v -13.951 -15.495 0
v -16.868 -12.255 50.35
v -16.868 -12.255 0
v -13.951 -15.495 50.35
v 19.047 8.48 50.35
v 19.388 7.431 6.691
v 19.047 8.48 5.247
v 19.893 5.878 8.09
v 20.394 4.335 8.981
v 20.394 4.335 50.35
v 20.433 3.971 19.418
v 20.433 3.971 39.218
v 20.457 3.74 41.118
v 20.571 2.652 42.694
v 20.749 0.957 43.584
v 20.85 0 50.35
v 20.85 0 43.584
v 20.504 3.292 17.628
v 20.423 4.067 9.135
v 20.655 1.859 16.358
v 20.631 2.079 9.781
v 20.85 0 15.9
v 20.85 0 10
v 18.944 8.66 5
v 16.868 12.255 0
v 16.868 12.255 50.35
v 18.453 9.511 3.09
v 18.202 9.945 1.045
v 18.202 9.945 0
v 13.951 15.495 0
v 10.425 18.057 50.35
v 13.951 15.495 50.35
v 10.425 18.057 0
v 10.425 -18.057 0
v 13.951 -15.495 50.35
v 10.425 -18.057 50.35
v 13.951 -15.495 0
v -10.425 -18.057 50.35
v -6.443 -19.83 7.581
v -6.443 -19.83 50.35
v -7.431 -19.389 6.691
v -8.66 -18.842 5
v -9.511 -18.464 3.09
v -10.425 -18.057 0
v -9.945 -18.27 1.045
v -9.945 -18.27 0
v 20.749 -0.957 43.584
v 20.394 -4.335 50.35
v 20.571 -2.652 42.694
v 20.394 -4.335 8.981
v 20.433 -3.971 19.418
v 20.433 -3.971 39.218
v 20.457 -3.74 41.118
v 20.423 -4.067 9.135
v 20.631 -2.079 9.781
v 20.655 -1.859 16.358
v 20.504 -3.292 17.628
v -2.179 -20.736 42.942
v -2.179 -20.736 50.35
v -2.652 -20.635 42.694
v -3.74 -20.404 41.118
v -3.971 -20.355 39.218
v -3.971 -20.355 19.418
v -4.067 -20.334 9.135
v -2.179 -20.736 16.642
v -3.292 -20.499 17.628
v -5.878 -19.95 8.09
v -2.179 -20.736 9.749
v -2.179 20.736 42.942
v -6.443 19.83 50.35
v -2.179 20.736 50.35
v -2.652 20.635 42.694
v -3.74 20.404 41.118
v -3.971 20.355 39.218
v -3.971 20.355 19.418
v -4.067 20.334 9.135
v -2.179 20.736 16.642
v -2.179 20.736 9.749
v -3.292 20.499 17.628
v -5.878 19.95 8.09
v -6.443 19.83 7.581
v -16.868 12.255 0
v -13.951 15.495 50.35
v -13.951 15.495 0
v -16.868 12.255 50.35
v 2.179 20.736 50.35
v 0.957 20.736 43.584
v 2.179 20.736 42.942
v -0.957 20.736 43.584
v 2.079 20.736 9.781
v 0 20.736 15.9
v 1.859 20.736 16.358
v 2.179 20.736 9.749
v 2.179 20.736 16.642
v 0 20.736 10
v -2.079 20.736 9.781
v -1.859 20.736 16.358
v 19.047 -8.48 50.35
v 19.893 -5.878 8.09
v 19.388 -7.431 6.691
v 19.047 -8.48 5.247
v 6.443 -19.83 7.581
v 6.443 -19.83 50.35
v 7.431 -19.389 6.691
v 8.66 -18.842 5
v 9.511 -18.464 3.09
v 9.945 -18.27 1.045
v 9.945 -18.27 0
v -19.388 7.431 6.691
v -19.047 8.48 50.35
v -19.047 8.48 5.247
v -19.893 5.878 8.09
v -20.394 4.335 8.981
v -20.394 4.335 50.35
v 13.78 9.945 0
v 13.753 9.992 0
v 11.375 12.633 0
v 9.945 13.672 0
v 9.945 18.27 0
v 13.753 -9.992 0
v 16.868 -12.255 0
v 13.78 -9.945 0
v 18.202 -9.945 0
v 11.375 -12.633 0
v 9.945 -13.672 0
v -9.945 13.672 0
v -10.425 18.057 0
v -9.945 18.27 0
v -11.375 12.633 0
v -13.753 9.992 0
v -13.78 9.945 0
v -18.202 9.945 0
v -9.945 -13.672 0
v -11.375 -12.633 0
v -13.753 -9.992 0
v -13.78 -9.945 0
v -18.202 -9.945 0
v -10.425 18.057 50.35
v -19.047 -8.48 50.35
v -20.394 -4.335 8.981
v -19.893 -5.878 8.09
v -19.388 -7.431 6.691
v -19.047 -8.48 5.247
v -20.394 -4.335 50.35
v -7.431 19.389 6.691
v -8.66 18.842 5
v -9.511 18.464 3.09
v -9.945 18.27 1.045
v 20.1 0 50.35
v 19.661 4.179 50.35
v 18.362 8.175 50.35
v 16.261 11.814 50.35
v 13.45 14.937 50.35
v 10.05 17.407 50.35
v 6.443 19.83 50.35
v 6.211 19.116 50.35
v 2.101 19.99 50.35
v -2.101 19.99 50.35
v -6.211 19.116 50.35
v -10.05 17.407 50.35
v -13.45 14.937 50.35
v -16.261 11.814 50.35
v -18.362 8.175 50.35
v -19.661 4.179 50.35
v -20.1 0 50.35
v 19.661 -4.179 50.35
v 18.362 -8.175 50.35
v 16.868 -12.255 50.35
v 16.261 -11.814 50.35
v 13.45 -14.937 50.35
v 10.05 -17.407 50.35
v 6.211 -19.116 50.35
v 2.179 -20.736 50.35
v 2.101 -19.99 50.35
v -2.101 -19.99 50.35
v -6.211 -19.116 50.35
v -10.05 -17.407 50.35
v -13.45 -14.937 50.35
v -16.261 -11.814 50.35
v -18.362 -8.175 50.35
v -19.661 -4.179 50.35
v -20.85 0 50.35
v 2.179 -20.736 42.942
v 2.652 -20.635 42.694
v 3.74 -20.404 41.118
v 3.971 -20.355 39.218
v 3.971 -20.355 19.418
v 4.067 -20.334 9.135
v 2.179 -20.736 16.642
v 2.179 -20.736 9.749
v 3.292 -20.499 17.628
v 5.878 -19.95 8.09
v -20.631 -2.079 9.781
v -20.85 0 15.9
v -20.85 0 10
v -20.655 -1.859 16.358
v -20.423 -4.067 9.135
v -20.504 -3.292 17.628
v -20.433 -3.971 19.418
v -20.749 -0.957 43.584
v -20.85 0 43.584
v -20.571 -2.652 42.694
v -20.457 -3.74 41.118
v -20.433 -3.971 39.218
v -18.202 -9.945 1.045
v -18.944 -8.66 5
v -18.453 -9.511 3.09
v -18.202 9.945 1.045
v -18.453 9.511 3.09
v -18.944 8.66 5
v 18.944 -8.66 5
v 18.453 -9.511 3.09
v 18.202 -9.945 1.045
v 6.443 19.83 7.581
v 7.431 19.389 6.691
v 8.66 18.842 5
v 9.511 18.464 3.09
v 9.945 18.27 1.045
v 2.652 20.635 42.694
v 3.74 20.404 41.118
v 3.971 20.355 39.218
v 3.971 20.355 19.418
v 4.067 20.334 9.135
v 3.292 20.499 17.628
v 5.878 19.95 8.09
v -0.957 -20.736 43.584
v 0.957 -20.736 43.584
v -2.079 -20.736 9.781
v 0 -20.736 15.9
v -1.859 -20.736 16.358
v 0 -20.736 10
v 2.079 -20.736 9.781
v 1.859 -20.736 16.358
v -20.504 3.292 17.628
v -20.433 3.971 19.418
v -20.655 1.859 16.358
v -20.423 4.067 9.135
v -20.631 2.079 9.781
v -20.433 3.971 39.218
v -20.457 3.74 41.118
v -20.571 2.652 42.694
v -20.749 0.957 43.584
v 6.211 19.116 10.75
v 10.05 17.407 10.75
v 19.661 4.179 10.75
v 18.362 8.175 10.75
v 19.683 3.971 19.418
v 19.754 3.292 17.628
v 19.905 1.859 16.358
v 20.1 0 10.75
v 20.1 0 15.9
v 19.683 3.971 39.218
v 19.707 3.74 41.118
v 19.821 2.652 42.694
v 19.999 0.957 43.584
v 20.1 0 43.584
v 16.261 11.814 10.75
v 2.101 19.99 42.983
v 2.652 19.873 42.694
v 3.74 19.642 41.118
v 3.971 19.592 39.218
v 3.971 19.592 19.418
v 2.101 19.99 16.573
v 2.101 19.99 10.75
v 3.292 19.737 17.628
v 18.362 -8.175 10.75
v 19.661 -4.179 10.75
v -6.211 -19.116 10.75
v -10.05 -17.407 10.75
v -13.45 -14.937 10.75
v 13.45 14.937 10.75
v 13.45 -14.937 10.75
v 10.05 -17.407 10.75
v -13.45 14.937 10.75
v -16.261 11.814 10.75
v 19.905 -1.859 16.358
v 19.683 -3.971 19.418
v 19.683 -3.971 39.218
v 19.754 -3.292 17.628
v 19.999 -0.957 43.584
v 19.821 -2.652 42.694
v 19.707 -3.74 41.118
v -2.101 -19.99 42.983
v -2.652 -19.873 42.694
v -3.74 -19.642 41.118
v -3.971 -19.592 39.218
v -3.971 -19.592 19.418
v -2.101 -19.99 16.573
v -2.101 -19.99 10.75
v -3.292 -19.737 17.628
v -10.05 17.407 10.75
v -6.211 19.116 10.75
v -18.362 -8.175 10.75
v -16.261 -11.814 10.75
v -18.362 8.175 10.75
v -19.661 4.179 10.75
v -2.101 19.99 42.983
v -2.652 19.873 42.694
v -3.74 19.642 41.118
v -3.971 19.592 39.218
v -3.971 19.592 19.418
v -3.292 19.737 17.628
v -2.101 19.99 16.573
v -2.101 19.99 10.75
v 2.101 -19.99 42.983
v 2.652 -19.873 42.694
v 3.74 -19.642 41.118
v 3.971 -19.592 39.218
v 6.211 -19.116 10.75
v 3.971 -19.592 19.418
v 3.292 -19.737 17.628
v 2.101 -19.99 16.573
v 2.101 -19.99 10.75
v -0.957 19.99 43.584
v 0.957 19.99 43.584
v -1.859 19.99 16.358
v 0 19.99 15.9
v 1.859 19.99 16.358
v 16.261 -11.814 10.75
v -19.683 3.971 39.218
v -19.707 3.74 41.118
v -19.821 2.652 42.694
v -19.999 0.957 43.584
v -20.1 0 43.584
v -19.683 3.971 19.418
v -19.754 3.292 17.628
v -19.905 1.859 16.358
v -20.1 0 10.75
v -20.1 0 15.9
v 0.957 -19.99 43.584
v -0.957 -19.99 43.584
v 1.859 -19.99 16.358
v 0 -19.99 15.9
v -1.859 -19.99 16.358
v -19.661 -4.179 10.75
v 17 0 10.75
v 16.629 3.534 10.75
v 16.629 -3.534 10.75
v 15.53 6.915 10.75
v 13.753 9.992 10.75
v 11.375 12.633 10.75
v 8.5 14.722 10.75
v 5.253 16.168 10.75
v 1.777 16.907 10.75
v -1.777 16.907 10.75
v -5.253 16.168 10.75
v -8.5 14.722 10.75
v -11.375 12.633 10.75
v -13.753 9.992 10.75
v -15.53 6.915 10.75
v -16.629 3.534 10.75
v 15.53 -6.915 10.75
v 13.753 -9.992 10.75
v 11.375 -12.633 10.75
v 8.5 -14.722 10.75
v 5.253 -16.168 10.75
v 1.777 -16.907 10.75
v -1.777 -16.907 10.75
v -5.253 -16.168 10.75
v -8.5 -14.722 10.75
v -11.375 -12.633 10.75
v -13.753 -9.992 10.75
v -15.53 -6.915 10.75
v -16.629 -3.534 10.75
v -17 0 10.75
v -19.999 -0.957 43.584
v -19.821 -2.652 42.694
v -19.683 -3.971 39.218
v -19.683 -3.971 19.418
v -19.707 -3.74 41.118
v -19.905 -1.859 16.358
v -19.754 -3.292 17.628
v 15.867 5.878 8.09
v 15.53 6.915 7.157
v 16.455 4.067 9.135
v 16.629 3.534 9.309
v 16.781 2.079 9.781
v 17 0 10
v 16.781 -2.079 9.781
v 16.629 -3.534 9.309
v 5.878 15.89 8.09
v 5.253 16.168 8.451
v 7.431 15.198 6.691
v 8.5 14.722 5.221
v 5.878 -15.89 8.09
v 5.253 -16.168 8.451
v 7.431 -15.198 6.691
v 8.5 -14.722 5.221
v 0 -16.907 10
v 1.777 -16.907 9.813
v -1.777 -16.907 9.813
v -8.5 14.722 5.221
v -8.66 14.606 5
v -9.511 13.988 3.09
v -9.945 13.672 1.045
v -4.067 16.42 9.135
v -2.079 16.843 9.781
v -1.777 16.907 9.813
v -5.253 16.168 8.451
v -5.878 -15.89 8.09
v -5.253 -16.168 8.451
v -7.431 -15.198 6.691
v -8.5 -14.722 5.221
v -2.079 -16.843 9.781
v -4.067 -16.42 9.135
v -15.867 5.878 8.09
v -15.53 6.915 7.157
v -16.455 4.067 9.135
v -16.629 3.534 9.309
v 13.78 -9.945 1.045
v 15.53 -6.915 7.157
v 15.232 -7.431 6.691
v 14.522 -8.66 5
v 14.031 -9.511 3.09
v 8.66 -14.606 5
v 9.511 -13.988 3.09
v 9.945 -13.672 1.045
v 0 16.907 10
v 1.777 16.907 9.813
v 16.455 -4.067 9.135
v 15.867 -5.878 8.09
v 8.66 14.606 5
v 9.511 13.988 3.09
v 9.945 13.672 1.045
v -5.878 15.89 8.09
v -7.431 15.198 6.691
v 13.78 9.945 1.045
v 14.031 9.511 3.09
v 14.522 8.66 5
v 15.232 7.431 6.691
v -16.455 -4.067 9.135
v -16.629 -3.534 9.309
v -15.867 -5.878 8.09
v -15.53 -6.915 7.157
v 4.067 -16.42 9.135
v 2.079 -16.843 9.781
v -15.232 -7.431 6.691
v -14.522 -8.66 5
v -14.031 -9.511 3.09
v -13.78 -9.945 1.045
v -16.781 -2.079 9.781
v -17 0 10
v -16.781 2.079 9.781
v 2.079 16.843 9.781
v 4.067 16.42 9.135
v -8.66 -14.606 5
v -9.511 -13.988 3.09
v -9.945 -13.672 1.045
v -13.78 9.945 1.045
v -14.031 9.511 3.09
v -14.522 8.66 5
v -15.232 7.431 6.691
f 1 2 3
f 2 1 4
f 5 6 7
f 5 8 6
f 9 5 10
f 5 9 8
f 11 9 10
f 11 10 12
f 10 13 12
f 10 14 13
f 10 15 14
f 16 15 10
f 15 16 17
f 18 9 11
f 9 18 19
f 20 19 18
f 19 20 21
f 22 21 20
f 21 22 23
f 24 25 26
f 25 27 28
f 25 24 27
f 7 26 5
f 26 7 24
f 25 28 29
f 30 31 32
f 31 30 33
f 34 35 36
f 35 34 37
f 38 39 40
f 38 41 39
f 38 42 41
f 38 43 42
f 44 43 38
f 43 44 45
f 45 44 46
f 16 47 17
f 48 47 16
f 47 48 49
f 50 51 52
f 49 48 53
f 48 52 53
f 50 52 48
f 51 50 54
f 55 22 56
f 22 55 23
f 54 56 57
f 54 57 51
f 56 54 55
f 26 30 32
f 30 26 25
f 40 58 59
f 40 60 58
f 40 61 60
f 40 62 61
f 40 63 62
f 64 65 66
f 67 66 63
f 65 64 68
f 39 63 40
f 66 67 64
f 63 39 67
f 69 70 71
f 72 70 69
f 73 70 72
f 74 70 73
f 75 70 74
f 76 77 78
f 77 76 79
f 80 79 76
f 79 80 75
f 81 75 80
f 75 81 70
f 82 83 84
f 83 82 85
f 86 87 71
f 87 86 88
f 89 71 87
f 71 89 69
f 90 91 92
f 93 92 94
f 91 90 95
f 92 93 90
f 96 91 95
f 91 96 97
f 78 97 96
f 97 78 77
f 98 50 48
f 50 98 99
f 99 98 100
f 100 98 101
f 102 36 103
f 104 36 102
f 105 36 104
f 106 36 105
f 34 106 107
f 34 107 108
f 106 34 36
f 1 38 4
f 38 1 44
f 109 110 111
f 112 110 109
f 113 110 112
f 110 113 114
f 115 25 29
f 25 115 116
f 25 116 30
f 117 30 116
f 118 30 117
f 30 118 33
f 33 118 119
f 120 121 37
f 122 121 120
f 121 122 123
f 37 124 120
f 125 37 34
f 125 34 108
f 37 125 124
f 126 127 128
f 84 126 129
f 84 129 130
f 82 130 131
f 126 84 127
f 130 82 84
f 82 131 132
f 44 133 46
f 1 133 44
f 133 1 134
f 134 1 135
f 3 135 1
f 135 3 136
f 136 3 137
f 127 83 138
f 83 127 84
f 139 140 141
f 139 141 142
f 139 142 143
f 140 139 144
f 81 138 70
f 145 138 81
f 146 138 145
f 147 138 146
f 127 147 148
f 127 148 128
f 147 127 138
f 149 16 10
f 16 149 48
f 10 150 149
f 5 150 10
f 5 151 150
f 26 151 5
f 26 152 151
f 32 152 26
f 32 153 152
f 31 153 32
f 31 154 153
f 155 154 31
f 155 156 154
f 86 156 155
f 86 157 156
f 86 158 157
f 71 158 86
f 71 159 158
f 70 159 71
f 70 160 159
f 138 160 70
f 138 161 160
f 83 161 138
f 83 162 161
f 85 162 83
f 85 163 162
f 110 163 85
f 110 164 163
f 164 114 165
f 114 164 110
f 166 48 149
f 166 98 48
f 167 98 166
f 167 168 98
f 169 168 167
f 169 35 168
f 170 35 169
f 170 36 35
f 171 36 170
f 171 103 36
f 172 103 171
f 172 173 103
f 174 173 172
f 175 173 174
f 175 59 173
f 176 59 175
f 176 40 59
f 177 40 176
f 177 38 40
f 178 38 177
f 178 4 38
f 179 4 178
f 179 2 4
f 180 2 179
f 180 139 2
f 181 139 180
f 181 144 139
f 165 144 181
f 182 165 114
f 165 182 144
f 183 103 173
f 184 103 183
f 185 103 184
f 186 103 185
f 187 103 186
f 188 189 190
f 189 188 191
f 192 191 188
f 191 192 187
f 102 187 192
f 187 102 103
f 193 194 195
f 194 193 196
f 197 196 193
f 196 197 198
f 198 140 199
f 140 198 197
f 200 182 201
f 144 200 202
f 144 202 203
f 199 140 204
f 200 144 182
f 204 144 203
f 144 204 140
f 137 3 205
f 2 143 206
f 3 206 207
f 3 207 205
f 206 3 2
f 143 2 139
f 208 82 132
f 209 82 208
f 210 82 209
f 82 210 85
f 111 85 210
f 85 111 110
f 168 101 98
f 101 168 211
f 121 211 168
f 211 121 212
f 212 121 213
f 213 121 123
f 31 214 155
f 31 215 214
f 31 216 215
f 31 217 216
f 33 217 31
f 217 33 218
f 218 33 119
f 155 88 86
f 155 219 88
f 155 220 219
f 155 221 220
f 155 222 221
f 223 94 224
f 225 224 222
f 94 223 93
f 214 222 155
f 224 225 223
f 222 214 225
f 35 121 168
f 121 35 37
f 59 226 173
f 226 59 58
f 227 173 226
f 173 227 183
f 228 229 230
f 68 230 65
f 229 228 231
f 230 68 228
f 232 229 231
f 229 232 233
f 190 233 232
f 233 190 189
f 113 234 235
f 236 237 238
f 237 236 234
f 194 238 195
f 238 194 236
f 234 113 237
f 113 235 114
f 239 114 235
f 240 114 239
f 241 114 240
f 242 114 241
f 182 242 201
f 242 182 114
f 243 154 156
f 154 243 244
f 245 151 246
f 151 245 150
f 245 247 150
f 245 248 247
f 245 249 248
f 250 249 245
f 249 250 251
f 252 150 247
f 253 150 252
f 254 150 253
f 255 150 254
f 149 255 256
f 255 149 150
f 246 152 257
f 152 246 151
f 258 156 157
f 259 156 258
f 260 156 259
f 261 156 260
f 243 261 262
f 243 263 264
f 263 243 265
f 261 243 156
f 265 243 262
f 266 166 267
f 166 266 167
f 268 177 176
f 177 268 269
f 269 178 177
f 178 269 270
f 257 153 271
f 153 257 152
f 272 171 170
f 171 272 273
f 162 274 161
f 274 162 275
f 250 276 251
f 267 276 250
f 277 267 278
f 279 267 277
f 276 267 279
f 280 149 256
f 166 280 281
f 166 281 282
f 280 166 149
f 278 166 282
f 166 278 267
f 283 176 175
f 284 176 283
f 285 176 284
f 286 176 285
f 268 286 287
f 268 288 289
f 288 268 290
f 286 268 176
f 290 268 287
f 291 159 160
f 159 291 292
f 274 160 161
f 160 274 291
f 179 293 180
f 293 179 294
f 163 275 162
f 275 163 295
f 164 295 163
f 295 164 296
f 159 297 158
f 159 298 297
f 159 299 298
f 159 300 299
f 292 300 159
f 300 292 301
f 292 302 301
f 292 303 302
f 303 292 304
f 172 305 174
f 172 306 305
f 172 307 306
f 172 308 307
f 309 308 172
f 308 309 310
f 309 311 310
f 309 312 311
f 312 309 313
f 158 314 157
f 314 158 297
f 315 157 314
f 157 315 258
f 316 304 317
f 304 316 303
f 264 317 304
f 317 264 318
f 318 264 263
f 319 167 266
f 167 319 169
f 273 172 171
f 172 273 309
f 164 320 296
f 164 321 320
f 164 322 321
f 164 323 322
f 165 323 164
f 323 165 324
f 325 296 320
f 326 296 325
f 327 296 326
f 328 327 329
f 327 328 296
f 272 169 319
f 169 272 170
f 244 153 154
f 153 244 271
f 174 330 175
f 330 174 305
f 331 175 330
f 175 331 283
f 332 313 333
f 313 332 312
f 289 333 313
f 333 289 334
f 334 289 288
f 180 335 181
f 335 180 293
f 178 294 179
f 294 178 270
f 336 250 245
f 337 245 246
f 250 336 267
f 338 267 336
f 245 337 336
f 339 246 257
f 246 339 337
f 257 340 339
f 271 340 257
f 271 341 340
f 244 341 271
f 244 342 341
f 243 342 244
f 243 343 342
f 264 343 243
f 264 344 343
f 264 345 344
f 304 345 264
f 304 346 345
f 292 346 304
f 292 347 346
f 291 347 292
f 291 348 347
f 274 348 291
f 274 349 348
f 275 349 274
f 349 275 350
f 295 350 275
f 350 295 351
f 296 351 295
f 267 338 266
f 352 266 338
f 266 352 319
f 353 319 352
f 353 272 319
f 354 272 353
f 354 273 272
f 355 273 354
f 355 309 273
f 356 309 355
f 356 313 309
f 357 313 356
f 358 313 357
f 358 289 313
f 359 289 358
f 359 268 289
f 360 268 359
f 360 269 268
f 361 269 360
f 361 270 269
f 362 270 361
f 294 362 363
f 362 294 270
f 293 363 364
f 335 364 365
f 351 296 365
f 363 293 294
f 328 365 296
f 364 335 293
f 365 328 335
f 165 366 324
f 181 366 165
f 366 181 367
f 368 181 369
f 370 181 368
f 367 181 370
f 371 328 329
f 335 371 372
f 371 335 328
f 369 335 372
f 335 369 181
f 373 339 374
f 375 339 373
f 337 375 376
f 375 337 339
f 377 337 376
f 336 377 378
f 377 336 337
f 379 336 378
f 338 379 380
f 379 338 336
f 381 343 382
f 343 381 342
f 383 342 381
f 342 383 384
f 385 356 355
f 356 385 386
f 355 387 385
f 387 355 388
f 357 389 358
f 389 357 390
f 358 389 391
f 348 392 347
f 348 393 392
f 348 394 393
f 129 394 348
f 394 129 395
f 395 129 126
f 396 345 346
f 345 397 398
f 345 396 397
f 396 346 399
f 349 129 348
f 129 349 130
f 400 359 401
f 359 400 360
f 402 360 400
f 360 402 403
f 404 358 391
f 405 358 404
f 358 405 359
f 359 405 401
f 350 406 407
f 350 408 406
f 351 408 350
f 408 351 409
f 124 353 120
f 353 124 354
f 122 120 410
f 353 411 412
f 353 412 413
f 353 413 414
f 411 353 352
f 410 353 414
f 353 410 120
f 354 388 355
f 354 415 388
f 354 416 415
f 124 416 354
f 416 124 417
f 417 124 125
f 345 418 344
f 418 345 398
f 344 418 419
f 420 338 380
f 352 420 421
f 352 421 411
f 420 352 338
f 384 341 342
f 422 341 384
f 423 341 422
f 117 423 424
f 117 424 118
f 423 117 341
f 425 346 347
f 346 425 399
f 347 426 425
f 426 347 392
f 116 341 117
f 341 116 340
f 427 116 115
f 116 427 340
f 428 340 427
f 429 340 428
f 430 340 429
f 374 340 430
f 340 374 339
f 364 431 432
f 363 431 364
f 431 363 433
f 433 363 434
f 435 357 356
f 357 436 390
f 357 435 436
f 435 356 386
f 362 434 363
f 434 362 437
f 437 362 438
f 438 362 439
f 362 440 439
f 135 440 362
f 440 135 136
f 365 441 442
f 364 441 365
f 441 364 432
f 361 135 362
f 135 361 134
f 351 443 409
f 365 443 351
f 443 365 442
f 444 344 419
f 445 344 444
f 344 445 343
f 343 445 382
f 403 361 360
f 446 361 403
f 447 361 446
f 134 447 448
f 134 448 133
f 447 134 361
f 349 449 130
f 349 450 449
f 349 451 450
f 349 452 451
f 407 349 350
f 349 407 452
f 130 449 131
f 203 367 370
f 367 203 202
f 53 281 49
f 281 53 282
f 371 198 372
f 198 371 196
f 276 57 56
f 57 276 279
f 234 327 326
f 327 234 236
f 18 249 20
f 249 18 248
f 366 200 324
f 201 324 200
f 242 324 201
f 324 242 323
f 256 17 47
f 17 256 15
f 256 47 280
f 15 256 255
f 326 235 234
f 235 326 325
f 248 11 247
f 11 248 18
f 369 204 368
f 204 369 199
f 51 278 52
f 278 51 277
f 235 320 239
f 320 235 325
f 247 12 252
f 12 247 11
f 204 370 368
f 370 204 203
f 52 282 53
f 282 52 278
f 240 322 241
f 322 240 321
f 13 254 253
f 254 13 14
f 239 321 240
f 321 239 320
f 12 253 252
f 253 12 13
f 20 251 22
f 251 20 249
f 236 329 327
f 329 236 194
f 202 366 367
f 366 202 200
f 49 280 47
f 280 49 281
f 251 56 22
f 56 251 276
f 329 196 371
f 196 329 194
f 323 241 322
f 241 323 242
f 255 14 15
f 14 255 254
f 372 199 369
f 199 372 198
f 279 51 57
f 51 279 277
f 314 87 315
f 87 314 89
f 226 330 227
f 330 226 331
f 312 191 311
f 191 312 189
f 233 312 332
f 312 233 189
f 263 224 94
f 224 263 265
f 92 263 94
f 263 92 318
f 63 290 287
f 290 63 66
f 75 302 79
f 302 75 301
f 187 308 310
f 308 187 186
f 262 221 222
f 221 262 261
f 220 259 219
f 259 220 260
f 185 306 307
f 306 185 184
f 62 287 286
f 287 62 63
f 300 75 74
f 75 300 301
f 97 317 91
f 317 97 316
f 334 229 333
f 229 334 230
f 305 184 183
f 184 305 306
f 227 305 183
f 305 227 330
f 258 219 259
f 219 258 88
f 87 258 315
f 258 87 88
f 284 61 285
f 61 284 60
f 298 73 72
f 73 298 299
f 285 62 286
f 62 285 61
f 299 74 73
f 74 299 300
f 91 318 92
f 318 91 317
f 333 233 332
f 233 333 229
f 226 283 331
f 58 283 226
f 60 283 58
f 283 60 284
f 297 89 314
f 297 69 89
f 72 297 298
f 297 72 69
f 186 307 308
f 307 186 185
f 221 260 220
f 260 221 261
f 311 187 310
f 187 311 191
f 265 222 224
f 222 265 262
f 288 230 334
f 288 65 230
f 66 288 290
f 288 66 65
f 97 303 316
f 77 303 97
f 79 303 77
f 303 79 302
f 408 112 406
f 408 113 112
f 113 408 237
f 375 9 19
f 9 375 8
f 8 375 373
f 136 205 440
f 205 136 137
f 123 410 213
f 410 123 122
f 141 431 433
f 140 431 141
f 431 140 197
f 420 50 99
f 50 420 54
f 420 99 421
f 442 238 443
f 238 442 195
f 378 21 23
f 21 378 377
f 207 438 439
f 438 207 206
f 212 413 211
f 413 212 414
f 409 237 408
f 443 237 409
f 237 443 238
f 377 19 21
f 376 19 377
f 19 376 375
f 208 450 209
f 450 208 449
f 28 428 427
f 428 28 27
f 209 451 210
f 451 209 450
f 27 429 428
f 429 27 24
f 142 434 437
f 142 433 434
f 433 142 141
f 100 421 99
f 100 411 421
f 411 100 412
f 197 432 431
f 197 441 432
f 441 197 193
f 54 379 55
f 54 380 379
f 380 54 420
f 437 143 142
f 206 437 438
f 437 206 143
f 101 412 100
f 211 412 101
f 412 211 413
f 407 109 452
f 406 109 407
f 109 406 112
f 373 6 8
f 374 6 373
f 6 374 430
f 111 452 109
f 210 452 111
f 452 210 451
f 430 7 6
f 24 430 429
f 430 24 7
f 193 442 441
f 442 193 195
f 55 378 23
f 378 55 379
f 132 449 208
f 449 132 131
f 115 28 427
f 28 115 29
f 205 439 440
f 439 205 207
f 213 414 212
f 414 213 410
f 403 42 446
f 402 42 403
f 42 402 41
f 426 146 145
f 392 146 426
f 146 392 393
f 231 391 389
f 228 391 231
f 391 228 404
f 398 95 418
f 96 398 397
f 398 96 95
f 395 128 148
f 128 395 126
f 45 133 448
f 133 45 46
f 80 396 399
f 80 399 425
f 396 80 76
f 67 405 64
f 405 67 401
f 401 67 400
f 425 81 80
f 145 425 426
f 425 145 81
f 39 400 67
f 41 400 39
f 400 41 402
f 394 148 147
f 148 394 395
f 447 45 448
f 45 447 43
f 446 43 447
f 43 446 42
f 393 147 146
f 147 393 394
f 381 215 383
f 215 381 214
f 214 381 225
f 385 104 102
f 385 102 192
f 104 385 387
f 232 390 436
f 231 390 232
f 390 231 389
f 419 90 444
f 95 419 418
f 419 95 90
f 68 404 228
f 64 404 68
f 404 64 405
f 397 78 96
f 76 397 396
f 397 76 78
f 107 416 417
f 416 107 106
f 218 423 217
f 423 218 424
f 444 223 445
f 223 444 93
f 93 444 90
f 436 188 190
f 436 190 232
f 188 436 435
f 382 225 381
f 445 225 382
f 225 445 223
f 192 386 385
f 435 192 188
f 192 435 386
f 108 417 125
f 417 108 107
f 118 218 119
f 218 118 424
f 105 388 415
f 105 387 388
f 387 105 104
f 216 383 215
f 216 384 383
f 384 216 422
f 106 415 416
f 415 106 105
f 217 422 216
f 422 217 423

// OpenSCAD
// millimeters
chip_diameter = 40;

// millimeters
chip_thickness = 3.3;

// number of chips
stack_height = 12;

wall_thickness = 0.75;

slot_opening = 8;

leg_length = 10;

/* [Hidden] */

slop = 0.2;

difference() {
    cylinder(h=((stack_height * chip_thickness) + wall_thickness + leg_length), d=(chip_diameter + (2 * wall_thickness) + slop));
    
    translate([0,0,wall_thickness + leg_length])
    cylinder(h=(stack_height * chip_thickness), d=chip_diameter + slop);
    
    cylinder(h=(wall_thickness + leg_length), d=(chip_diameter - (8 * wall_thickness)));
        
    translate([-(chip_diameter + (2 * wall_thickness) + slop)/2, 0, (chip_thickness * stack_height)/2 + leg_length])
    rotate([0,90,0])
    hull() {
        translate([(chip_thickness * stack_height)/4, 0, 0])
        cylinder(h=(chip_diameter + (2 * wall_thickness) + slop), d=slot_opening);
        
        translate([-(chip_thickness * stack_height)/4, 0, 0])
        cylinder(h=(chip_diameter + (2 * wall_thickness) + slop), d=slot_opening);
    };
    
    translate([0, -(chip_diameter + (2 * wall_thickness) + slop)/2, (chip_thickness * stack_height)/2 + leg_length])
    rotate([0,90,90])
    hull() {
        translate([(chip_thickness * stack_height)/4, 0, 0])
        cylinder(h=(chip_diameter + (2 * wall_thickness) + slop), d=slot_opening);
        
        translate([-(chip_thickness * stack_height)/4, 0, 0])
        cylinder(h=(chip_diameter + (2 * wall_thickness) + slop), d=slot_opening);
    };
    
    translate([-(chip_diameter + (2 * wall_thickness) + slop)/2,0,0])
    rotate([0,90,0])
    cylinder(h=(chip_diameter + (2 * wall_thickness) + slop), d=(chip_diameter/2));
    
    translate([0,-(chip_diameter + (2 * wall_thickness) + slop)/2,0])
    rotate([0,90,90])
    cylinder(h=(chip_diameter + (2 * wall_thickness) + slop), d=(chip_diameter/2));
};
